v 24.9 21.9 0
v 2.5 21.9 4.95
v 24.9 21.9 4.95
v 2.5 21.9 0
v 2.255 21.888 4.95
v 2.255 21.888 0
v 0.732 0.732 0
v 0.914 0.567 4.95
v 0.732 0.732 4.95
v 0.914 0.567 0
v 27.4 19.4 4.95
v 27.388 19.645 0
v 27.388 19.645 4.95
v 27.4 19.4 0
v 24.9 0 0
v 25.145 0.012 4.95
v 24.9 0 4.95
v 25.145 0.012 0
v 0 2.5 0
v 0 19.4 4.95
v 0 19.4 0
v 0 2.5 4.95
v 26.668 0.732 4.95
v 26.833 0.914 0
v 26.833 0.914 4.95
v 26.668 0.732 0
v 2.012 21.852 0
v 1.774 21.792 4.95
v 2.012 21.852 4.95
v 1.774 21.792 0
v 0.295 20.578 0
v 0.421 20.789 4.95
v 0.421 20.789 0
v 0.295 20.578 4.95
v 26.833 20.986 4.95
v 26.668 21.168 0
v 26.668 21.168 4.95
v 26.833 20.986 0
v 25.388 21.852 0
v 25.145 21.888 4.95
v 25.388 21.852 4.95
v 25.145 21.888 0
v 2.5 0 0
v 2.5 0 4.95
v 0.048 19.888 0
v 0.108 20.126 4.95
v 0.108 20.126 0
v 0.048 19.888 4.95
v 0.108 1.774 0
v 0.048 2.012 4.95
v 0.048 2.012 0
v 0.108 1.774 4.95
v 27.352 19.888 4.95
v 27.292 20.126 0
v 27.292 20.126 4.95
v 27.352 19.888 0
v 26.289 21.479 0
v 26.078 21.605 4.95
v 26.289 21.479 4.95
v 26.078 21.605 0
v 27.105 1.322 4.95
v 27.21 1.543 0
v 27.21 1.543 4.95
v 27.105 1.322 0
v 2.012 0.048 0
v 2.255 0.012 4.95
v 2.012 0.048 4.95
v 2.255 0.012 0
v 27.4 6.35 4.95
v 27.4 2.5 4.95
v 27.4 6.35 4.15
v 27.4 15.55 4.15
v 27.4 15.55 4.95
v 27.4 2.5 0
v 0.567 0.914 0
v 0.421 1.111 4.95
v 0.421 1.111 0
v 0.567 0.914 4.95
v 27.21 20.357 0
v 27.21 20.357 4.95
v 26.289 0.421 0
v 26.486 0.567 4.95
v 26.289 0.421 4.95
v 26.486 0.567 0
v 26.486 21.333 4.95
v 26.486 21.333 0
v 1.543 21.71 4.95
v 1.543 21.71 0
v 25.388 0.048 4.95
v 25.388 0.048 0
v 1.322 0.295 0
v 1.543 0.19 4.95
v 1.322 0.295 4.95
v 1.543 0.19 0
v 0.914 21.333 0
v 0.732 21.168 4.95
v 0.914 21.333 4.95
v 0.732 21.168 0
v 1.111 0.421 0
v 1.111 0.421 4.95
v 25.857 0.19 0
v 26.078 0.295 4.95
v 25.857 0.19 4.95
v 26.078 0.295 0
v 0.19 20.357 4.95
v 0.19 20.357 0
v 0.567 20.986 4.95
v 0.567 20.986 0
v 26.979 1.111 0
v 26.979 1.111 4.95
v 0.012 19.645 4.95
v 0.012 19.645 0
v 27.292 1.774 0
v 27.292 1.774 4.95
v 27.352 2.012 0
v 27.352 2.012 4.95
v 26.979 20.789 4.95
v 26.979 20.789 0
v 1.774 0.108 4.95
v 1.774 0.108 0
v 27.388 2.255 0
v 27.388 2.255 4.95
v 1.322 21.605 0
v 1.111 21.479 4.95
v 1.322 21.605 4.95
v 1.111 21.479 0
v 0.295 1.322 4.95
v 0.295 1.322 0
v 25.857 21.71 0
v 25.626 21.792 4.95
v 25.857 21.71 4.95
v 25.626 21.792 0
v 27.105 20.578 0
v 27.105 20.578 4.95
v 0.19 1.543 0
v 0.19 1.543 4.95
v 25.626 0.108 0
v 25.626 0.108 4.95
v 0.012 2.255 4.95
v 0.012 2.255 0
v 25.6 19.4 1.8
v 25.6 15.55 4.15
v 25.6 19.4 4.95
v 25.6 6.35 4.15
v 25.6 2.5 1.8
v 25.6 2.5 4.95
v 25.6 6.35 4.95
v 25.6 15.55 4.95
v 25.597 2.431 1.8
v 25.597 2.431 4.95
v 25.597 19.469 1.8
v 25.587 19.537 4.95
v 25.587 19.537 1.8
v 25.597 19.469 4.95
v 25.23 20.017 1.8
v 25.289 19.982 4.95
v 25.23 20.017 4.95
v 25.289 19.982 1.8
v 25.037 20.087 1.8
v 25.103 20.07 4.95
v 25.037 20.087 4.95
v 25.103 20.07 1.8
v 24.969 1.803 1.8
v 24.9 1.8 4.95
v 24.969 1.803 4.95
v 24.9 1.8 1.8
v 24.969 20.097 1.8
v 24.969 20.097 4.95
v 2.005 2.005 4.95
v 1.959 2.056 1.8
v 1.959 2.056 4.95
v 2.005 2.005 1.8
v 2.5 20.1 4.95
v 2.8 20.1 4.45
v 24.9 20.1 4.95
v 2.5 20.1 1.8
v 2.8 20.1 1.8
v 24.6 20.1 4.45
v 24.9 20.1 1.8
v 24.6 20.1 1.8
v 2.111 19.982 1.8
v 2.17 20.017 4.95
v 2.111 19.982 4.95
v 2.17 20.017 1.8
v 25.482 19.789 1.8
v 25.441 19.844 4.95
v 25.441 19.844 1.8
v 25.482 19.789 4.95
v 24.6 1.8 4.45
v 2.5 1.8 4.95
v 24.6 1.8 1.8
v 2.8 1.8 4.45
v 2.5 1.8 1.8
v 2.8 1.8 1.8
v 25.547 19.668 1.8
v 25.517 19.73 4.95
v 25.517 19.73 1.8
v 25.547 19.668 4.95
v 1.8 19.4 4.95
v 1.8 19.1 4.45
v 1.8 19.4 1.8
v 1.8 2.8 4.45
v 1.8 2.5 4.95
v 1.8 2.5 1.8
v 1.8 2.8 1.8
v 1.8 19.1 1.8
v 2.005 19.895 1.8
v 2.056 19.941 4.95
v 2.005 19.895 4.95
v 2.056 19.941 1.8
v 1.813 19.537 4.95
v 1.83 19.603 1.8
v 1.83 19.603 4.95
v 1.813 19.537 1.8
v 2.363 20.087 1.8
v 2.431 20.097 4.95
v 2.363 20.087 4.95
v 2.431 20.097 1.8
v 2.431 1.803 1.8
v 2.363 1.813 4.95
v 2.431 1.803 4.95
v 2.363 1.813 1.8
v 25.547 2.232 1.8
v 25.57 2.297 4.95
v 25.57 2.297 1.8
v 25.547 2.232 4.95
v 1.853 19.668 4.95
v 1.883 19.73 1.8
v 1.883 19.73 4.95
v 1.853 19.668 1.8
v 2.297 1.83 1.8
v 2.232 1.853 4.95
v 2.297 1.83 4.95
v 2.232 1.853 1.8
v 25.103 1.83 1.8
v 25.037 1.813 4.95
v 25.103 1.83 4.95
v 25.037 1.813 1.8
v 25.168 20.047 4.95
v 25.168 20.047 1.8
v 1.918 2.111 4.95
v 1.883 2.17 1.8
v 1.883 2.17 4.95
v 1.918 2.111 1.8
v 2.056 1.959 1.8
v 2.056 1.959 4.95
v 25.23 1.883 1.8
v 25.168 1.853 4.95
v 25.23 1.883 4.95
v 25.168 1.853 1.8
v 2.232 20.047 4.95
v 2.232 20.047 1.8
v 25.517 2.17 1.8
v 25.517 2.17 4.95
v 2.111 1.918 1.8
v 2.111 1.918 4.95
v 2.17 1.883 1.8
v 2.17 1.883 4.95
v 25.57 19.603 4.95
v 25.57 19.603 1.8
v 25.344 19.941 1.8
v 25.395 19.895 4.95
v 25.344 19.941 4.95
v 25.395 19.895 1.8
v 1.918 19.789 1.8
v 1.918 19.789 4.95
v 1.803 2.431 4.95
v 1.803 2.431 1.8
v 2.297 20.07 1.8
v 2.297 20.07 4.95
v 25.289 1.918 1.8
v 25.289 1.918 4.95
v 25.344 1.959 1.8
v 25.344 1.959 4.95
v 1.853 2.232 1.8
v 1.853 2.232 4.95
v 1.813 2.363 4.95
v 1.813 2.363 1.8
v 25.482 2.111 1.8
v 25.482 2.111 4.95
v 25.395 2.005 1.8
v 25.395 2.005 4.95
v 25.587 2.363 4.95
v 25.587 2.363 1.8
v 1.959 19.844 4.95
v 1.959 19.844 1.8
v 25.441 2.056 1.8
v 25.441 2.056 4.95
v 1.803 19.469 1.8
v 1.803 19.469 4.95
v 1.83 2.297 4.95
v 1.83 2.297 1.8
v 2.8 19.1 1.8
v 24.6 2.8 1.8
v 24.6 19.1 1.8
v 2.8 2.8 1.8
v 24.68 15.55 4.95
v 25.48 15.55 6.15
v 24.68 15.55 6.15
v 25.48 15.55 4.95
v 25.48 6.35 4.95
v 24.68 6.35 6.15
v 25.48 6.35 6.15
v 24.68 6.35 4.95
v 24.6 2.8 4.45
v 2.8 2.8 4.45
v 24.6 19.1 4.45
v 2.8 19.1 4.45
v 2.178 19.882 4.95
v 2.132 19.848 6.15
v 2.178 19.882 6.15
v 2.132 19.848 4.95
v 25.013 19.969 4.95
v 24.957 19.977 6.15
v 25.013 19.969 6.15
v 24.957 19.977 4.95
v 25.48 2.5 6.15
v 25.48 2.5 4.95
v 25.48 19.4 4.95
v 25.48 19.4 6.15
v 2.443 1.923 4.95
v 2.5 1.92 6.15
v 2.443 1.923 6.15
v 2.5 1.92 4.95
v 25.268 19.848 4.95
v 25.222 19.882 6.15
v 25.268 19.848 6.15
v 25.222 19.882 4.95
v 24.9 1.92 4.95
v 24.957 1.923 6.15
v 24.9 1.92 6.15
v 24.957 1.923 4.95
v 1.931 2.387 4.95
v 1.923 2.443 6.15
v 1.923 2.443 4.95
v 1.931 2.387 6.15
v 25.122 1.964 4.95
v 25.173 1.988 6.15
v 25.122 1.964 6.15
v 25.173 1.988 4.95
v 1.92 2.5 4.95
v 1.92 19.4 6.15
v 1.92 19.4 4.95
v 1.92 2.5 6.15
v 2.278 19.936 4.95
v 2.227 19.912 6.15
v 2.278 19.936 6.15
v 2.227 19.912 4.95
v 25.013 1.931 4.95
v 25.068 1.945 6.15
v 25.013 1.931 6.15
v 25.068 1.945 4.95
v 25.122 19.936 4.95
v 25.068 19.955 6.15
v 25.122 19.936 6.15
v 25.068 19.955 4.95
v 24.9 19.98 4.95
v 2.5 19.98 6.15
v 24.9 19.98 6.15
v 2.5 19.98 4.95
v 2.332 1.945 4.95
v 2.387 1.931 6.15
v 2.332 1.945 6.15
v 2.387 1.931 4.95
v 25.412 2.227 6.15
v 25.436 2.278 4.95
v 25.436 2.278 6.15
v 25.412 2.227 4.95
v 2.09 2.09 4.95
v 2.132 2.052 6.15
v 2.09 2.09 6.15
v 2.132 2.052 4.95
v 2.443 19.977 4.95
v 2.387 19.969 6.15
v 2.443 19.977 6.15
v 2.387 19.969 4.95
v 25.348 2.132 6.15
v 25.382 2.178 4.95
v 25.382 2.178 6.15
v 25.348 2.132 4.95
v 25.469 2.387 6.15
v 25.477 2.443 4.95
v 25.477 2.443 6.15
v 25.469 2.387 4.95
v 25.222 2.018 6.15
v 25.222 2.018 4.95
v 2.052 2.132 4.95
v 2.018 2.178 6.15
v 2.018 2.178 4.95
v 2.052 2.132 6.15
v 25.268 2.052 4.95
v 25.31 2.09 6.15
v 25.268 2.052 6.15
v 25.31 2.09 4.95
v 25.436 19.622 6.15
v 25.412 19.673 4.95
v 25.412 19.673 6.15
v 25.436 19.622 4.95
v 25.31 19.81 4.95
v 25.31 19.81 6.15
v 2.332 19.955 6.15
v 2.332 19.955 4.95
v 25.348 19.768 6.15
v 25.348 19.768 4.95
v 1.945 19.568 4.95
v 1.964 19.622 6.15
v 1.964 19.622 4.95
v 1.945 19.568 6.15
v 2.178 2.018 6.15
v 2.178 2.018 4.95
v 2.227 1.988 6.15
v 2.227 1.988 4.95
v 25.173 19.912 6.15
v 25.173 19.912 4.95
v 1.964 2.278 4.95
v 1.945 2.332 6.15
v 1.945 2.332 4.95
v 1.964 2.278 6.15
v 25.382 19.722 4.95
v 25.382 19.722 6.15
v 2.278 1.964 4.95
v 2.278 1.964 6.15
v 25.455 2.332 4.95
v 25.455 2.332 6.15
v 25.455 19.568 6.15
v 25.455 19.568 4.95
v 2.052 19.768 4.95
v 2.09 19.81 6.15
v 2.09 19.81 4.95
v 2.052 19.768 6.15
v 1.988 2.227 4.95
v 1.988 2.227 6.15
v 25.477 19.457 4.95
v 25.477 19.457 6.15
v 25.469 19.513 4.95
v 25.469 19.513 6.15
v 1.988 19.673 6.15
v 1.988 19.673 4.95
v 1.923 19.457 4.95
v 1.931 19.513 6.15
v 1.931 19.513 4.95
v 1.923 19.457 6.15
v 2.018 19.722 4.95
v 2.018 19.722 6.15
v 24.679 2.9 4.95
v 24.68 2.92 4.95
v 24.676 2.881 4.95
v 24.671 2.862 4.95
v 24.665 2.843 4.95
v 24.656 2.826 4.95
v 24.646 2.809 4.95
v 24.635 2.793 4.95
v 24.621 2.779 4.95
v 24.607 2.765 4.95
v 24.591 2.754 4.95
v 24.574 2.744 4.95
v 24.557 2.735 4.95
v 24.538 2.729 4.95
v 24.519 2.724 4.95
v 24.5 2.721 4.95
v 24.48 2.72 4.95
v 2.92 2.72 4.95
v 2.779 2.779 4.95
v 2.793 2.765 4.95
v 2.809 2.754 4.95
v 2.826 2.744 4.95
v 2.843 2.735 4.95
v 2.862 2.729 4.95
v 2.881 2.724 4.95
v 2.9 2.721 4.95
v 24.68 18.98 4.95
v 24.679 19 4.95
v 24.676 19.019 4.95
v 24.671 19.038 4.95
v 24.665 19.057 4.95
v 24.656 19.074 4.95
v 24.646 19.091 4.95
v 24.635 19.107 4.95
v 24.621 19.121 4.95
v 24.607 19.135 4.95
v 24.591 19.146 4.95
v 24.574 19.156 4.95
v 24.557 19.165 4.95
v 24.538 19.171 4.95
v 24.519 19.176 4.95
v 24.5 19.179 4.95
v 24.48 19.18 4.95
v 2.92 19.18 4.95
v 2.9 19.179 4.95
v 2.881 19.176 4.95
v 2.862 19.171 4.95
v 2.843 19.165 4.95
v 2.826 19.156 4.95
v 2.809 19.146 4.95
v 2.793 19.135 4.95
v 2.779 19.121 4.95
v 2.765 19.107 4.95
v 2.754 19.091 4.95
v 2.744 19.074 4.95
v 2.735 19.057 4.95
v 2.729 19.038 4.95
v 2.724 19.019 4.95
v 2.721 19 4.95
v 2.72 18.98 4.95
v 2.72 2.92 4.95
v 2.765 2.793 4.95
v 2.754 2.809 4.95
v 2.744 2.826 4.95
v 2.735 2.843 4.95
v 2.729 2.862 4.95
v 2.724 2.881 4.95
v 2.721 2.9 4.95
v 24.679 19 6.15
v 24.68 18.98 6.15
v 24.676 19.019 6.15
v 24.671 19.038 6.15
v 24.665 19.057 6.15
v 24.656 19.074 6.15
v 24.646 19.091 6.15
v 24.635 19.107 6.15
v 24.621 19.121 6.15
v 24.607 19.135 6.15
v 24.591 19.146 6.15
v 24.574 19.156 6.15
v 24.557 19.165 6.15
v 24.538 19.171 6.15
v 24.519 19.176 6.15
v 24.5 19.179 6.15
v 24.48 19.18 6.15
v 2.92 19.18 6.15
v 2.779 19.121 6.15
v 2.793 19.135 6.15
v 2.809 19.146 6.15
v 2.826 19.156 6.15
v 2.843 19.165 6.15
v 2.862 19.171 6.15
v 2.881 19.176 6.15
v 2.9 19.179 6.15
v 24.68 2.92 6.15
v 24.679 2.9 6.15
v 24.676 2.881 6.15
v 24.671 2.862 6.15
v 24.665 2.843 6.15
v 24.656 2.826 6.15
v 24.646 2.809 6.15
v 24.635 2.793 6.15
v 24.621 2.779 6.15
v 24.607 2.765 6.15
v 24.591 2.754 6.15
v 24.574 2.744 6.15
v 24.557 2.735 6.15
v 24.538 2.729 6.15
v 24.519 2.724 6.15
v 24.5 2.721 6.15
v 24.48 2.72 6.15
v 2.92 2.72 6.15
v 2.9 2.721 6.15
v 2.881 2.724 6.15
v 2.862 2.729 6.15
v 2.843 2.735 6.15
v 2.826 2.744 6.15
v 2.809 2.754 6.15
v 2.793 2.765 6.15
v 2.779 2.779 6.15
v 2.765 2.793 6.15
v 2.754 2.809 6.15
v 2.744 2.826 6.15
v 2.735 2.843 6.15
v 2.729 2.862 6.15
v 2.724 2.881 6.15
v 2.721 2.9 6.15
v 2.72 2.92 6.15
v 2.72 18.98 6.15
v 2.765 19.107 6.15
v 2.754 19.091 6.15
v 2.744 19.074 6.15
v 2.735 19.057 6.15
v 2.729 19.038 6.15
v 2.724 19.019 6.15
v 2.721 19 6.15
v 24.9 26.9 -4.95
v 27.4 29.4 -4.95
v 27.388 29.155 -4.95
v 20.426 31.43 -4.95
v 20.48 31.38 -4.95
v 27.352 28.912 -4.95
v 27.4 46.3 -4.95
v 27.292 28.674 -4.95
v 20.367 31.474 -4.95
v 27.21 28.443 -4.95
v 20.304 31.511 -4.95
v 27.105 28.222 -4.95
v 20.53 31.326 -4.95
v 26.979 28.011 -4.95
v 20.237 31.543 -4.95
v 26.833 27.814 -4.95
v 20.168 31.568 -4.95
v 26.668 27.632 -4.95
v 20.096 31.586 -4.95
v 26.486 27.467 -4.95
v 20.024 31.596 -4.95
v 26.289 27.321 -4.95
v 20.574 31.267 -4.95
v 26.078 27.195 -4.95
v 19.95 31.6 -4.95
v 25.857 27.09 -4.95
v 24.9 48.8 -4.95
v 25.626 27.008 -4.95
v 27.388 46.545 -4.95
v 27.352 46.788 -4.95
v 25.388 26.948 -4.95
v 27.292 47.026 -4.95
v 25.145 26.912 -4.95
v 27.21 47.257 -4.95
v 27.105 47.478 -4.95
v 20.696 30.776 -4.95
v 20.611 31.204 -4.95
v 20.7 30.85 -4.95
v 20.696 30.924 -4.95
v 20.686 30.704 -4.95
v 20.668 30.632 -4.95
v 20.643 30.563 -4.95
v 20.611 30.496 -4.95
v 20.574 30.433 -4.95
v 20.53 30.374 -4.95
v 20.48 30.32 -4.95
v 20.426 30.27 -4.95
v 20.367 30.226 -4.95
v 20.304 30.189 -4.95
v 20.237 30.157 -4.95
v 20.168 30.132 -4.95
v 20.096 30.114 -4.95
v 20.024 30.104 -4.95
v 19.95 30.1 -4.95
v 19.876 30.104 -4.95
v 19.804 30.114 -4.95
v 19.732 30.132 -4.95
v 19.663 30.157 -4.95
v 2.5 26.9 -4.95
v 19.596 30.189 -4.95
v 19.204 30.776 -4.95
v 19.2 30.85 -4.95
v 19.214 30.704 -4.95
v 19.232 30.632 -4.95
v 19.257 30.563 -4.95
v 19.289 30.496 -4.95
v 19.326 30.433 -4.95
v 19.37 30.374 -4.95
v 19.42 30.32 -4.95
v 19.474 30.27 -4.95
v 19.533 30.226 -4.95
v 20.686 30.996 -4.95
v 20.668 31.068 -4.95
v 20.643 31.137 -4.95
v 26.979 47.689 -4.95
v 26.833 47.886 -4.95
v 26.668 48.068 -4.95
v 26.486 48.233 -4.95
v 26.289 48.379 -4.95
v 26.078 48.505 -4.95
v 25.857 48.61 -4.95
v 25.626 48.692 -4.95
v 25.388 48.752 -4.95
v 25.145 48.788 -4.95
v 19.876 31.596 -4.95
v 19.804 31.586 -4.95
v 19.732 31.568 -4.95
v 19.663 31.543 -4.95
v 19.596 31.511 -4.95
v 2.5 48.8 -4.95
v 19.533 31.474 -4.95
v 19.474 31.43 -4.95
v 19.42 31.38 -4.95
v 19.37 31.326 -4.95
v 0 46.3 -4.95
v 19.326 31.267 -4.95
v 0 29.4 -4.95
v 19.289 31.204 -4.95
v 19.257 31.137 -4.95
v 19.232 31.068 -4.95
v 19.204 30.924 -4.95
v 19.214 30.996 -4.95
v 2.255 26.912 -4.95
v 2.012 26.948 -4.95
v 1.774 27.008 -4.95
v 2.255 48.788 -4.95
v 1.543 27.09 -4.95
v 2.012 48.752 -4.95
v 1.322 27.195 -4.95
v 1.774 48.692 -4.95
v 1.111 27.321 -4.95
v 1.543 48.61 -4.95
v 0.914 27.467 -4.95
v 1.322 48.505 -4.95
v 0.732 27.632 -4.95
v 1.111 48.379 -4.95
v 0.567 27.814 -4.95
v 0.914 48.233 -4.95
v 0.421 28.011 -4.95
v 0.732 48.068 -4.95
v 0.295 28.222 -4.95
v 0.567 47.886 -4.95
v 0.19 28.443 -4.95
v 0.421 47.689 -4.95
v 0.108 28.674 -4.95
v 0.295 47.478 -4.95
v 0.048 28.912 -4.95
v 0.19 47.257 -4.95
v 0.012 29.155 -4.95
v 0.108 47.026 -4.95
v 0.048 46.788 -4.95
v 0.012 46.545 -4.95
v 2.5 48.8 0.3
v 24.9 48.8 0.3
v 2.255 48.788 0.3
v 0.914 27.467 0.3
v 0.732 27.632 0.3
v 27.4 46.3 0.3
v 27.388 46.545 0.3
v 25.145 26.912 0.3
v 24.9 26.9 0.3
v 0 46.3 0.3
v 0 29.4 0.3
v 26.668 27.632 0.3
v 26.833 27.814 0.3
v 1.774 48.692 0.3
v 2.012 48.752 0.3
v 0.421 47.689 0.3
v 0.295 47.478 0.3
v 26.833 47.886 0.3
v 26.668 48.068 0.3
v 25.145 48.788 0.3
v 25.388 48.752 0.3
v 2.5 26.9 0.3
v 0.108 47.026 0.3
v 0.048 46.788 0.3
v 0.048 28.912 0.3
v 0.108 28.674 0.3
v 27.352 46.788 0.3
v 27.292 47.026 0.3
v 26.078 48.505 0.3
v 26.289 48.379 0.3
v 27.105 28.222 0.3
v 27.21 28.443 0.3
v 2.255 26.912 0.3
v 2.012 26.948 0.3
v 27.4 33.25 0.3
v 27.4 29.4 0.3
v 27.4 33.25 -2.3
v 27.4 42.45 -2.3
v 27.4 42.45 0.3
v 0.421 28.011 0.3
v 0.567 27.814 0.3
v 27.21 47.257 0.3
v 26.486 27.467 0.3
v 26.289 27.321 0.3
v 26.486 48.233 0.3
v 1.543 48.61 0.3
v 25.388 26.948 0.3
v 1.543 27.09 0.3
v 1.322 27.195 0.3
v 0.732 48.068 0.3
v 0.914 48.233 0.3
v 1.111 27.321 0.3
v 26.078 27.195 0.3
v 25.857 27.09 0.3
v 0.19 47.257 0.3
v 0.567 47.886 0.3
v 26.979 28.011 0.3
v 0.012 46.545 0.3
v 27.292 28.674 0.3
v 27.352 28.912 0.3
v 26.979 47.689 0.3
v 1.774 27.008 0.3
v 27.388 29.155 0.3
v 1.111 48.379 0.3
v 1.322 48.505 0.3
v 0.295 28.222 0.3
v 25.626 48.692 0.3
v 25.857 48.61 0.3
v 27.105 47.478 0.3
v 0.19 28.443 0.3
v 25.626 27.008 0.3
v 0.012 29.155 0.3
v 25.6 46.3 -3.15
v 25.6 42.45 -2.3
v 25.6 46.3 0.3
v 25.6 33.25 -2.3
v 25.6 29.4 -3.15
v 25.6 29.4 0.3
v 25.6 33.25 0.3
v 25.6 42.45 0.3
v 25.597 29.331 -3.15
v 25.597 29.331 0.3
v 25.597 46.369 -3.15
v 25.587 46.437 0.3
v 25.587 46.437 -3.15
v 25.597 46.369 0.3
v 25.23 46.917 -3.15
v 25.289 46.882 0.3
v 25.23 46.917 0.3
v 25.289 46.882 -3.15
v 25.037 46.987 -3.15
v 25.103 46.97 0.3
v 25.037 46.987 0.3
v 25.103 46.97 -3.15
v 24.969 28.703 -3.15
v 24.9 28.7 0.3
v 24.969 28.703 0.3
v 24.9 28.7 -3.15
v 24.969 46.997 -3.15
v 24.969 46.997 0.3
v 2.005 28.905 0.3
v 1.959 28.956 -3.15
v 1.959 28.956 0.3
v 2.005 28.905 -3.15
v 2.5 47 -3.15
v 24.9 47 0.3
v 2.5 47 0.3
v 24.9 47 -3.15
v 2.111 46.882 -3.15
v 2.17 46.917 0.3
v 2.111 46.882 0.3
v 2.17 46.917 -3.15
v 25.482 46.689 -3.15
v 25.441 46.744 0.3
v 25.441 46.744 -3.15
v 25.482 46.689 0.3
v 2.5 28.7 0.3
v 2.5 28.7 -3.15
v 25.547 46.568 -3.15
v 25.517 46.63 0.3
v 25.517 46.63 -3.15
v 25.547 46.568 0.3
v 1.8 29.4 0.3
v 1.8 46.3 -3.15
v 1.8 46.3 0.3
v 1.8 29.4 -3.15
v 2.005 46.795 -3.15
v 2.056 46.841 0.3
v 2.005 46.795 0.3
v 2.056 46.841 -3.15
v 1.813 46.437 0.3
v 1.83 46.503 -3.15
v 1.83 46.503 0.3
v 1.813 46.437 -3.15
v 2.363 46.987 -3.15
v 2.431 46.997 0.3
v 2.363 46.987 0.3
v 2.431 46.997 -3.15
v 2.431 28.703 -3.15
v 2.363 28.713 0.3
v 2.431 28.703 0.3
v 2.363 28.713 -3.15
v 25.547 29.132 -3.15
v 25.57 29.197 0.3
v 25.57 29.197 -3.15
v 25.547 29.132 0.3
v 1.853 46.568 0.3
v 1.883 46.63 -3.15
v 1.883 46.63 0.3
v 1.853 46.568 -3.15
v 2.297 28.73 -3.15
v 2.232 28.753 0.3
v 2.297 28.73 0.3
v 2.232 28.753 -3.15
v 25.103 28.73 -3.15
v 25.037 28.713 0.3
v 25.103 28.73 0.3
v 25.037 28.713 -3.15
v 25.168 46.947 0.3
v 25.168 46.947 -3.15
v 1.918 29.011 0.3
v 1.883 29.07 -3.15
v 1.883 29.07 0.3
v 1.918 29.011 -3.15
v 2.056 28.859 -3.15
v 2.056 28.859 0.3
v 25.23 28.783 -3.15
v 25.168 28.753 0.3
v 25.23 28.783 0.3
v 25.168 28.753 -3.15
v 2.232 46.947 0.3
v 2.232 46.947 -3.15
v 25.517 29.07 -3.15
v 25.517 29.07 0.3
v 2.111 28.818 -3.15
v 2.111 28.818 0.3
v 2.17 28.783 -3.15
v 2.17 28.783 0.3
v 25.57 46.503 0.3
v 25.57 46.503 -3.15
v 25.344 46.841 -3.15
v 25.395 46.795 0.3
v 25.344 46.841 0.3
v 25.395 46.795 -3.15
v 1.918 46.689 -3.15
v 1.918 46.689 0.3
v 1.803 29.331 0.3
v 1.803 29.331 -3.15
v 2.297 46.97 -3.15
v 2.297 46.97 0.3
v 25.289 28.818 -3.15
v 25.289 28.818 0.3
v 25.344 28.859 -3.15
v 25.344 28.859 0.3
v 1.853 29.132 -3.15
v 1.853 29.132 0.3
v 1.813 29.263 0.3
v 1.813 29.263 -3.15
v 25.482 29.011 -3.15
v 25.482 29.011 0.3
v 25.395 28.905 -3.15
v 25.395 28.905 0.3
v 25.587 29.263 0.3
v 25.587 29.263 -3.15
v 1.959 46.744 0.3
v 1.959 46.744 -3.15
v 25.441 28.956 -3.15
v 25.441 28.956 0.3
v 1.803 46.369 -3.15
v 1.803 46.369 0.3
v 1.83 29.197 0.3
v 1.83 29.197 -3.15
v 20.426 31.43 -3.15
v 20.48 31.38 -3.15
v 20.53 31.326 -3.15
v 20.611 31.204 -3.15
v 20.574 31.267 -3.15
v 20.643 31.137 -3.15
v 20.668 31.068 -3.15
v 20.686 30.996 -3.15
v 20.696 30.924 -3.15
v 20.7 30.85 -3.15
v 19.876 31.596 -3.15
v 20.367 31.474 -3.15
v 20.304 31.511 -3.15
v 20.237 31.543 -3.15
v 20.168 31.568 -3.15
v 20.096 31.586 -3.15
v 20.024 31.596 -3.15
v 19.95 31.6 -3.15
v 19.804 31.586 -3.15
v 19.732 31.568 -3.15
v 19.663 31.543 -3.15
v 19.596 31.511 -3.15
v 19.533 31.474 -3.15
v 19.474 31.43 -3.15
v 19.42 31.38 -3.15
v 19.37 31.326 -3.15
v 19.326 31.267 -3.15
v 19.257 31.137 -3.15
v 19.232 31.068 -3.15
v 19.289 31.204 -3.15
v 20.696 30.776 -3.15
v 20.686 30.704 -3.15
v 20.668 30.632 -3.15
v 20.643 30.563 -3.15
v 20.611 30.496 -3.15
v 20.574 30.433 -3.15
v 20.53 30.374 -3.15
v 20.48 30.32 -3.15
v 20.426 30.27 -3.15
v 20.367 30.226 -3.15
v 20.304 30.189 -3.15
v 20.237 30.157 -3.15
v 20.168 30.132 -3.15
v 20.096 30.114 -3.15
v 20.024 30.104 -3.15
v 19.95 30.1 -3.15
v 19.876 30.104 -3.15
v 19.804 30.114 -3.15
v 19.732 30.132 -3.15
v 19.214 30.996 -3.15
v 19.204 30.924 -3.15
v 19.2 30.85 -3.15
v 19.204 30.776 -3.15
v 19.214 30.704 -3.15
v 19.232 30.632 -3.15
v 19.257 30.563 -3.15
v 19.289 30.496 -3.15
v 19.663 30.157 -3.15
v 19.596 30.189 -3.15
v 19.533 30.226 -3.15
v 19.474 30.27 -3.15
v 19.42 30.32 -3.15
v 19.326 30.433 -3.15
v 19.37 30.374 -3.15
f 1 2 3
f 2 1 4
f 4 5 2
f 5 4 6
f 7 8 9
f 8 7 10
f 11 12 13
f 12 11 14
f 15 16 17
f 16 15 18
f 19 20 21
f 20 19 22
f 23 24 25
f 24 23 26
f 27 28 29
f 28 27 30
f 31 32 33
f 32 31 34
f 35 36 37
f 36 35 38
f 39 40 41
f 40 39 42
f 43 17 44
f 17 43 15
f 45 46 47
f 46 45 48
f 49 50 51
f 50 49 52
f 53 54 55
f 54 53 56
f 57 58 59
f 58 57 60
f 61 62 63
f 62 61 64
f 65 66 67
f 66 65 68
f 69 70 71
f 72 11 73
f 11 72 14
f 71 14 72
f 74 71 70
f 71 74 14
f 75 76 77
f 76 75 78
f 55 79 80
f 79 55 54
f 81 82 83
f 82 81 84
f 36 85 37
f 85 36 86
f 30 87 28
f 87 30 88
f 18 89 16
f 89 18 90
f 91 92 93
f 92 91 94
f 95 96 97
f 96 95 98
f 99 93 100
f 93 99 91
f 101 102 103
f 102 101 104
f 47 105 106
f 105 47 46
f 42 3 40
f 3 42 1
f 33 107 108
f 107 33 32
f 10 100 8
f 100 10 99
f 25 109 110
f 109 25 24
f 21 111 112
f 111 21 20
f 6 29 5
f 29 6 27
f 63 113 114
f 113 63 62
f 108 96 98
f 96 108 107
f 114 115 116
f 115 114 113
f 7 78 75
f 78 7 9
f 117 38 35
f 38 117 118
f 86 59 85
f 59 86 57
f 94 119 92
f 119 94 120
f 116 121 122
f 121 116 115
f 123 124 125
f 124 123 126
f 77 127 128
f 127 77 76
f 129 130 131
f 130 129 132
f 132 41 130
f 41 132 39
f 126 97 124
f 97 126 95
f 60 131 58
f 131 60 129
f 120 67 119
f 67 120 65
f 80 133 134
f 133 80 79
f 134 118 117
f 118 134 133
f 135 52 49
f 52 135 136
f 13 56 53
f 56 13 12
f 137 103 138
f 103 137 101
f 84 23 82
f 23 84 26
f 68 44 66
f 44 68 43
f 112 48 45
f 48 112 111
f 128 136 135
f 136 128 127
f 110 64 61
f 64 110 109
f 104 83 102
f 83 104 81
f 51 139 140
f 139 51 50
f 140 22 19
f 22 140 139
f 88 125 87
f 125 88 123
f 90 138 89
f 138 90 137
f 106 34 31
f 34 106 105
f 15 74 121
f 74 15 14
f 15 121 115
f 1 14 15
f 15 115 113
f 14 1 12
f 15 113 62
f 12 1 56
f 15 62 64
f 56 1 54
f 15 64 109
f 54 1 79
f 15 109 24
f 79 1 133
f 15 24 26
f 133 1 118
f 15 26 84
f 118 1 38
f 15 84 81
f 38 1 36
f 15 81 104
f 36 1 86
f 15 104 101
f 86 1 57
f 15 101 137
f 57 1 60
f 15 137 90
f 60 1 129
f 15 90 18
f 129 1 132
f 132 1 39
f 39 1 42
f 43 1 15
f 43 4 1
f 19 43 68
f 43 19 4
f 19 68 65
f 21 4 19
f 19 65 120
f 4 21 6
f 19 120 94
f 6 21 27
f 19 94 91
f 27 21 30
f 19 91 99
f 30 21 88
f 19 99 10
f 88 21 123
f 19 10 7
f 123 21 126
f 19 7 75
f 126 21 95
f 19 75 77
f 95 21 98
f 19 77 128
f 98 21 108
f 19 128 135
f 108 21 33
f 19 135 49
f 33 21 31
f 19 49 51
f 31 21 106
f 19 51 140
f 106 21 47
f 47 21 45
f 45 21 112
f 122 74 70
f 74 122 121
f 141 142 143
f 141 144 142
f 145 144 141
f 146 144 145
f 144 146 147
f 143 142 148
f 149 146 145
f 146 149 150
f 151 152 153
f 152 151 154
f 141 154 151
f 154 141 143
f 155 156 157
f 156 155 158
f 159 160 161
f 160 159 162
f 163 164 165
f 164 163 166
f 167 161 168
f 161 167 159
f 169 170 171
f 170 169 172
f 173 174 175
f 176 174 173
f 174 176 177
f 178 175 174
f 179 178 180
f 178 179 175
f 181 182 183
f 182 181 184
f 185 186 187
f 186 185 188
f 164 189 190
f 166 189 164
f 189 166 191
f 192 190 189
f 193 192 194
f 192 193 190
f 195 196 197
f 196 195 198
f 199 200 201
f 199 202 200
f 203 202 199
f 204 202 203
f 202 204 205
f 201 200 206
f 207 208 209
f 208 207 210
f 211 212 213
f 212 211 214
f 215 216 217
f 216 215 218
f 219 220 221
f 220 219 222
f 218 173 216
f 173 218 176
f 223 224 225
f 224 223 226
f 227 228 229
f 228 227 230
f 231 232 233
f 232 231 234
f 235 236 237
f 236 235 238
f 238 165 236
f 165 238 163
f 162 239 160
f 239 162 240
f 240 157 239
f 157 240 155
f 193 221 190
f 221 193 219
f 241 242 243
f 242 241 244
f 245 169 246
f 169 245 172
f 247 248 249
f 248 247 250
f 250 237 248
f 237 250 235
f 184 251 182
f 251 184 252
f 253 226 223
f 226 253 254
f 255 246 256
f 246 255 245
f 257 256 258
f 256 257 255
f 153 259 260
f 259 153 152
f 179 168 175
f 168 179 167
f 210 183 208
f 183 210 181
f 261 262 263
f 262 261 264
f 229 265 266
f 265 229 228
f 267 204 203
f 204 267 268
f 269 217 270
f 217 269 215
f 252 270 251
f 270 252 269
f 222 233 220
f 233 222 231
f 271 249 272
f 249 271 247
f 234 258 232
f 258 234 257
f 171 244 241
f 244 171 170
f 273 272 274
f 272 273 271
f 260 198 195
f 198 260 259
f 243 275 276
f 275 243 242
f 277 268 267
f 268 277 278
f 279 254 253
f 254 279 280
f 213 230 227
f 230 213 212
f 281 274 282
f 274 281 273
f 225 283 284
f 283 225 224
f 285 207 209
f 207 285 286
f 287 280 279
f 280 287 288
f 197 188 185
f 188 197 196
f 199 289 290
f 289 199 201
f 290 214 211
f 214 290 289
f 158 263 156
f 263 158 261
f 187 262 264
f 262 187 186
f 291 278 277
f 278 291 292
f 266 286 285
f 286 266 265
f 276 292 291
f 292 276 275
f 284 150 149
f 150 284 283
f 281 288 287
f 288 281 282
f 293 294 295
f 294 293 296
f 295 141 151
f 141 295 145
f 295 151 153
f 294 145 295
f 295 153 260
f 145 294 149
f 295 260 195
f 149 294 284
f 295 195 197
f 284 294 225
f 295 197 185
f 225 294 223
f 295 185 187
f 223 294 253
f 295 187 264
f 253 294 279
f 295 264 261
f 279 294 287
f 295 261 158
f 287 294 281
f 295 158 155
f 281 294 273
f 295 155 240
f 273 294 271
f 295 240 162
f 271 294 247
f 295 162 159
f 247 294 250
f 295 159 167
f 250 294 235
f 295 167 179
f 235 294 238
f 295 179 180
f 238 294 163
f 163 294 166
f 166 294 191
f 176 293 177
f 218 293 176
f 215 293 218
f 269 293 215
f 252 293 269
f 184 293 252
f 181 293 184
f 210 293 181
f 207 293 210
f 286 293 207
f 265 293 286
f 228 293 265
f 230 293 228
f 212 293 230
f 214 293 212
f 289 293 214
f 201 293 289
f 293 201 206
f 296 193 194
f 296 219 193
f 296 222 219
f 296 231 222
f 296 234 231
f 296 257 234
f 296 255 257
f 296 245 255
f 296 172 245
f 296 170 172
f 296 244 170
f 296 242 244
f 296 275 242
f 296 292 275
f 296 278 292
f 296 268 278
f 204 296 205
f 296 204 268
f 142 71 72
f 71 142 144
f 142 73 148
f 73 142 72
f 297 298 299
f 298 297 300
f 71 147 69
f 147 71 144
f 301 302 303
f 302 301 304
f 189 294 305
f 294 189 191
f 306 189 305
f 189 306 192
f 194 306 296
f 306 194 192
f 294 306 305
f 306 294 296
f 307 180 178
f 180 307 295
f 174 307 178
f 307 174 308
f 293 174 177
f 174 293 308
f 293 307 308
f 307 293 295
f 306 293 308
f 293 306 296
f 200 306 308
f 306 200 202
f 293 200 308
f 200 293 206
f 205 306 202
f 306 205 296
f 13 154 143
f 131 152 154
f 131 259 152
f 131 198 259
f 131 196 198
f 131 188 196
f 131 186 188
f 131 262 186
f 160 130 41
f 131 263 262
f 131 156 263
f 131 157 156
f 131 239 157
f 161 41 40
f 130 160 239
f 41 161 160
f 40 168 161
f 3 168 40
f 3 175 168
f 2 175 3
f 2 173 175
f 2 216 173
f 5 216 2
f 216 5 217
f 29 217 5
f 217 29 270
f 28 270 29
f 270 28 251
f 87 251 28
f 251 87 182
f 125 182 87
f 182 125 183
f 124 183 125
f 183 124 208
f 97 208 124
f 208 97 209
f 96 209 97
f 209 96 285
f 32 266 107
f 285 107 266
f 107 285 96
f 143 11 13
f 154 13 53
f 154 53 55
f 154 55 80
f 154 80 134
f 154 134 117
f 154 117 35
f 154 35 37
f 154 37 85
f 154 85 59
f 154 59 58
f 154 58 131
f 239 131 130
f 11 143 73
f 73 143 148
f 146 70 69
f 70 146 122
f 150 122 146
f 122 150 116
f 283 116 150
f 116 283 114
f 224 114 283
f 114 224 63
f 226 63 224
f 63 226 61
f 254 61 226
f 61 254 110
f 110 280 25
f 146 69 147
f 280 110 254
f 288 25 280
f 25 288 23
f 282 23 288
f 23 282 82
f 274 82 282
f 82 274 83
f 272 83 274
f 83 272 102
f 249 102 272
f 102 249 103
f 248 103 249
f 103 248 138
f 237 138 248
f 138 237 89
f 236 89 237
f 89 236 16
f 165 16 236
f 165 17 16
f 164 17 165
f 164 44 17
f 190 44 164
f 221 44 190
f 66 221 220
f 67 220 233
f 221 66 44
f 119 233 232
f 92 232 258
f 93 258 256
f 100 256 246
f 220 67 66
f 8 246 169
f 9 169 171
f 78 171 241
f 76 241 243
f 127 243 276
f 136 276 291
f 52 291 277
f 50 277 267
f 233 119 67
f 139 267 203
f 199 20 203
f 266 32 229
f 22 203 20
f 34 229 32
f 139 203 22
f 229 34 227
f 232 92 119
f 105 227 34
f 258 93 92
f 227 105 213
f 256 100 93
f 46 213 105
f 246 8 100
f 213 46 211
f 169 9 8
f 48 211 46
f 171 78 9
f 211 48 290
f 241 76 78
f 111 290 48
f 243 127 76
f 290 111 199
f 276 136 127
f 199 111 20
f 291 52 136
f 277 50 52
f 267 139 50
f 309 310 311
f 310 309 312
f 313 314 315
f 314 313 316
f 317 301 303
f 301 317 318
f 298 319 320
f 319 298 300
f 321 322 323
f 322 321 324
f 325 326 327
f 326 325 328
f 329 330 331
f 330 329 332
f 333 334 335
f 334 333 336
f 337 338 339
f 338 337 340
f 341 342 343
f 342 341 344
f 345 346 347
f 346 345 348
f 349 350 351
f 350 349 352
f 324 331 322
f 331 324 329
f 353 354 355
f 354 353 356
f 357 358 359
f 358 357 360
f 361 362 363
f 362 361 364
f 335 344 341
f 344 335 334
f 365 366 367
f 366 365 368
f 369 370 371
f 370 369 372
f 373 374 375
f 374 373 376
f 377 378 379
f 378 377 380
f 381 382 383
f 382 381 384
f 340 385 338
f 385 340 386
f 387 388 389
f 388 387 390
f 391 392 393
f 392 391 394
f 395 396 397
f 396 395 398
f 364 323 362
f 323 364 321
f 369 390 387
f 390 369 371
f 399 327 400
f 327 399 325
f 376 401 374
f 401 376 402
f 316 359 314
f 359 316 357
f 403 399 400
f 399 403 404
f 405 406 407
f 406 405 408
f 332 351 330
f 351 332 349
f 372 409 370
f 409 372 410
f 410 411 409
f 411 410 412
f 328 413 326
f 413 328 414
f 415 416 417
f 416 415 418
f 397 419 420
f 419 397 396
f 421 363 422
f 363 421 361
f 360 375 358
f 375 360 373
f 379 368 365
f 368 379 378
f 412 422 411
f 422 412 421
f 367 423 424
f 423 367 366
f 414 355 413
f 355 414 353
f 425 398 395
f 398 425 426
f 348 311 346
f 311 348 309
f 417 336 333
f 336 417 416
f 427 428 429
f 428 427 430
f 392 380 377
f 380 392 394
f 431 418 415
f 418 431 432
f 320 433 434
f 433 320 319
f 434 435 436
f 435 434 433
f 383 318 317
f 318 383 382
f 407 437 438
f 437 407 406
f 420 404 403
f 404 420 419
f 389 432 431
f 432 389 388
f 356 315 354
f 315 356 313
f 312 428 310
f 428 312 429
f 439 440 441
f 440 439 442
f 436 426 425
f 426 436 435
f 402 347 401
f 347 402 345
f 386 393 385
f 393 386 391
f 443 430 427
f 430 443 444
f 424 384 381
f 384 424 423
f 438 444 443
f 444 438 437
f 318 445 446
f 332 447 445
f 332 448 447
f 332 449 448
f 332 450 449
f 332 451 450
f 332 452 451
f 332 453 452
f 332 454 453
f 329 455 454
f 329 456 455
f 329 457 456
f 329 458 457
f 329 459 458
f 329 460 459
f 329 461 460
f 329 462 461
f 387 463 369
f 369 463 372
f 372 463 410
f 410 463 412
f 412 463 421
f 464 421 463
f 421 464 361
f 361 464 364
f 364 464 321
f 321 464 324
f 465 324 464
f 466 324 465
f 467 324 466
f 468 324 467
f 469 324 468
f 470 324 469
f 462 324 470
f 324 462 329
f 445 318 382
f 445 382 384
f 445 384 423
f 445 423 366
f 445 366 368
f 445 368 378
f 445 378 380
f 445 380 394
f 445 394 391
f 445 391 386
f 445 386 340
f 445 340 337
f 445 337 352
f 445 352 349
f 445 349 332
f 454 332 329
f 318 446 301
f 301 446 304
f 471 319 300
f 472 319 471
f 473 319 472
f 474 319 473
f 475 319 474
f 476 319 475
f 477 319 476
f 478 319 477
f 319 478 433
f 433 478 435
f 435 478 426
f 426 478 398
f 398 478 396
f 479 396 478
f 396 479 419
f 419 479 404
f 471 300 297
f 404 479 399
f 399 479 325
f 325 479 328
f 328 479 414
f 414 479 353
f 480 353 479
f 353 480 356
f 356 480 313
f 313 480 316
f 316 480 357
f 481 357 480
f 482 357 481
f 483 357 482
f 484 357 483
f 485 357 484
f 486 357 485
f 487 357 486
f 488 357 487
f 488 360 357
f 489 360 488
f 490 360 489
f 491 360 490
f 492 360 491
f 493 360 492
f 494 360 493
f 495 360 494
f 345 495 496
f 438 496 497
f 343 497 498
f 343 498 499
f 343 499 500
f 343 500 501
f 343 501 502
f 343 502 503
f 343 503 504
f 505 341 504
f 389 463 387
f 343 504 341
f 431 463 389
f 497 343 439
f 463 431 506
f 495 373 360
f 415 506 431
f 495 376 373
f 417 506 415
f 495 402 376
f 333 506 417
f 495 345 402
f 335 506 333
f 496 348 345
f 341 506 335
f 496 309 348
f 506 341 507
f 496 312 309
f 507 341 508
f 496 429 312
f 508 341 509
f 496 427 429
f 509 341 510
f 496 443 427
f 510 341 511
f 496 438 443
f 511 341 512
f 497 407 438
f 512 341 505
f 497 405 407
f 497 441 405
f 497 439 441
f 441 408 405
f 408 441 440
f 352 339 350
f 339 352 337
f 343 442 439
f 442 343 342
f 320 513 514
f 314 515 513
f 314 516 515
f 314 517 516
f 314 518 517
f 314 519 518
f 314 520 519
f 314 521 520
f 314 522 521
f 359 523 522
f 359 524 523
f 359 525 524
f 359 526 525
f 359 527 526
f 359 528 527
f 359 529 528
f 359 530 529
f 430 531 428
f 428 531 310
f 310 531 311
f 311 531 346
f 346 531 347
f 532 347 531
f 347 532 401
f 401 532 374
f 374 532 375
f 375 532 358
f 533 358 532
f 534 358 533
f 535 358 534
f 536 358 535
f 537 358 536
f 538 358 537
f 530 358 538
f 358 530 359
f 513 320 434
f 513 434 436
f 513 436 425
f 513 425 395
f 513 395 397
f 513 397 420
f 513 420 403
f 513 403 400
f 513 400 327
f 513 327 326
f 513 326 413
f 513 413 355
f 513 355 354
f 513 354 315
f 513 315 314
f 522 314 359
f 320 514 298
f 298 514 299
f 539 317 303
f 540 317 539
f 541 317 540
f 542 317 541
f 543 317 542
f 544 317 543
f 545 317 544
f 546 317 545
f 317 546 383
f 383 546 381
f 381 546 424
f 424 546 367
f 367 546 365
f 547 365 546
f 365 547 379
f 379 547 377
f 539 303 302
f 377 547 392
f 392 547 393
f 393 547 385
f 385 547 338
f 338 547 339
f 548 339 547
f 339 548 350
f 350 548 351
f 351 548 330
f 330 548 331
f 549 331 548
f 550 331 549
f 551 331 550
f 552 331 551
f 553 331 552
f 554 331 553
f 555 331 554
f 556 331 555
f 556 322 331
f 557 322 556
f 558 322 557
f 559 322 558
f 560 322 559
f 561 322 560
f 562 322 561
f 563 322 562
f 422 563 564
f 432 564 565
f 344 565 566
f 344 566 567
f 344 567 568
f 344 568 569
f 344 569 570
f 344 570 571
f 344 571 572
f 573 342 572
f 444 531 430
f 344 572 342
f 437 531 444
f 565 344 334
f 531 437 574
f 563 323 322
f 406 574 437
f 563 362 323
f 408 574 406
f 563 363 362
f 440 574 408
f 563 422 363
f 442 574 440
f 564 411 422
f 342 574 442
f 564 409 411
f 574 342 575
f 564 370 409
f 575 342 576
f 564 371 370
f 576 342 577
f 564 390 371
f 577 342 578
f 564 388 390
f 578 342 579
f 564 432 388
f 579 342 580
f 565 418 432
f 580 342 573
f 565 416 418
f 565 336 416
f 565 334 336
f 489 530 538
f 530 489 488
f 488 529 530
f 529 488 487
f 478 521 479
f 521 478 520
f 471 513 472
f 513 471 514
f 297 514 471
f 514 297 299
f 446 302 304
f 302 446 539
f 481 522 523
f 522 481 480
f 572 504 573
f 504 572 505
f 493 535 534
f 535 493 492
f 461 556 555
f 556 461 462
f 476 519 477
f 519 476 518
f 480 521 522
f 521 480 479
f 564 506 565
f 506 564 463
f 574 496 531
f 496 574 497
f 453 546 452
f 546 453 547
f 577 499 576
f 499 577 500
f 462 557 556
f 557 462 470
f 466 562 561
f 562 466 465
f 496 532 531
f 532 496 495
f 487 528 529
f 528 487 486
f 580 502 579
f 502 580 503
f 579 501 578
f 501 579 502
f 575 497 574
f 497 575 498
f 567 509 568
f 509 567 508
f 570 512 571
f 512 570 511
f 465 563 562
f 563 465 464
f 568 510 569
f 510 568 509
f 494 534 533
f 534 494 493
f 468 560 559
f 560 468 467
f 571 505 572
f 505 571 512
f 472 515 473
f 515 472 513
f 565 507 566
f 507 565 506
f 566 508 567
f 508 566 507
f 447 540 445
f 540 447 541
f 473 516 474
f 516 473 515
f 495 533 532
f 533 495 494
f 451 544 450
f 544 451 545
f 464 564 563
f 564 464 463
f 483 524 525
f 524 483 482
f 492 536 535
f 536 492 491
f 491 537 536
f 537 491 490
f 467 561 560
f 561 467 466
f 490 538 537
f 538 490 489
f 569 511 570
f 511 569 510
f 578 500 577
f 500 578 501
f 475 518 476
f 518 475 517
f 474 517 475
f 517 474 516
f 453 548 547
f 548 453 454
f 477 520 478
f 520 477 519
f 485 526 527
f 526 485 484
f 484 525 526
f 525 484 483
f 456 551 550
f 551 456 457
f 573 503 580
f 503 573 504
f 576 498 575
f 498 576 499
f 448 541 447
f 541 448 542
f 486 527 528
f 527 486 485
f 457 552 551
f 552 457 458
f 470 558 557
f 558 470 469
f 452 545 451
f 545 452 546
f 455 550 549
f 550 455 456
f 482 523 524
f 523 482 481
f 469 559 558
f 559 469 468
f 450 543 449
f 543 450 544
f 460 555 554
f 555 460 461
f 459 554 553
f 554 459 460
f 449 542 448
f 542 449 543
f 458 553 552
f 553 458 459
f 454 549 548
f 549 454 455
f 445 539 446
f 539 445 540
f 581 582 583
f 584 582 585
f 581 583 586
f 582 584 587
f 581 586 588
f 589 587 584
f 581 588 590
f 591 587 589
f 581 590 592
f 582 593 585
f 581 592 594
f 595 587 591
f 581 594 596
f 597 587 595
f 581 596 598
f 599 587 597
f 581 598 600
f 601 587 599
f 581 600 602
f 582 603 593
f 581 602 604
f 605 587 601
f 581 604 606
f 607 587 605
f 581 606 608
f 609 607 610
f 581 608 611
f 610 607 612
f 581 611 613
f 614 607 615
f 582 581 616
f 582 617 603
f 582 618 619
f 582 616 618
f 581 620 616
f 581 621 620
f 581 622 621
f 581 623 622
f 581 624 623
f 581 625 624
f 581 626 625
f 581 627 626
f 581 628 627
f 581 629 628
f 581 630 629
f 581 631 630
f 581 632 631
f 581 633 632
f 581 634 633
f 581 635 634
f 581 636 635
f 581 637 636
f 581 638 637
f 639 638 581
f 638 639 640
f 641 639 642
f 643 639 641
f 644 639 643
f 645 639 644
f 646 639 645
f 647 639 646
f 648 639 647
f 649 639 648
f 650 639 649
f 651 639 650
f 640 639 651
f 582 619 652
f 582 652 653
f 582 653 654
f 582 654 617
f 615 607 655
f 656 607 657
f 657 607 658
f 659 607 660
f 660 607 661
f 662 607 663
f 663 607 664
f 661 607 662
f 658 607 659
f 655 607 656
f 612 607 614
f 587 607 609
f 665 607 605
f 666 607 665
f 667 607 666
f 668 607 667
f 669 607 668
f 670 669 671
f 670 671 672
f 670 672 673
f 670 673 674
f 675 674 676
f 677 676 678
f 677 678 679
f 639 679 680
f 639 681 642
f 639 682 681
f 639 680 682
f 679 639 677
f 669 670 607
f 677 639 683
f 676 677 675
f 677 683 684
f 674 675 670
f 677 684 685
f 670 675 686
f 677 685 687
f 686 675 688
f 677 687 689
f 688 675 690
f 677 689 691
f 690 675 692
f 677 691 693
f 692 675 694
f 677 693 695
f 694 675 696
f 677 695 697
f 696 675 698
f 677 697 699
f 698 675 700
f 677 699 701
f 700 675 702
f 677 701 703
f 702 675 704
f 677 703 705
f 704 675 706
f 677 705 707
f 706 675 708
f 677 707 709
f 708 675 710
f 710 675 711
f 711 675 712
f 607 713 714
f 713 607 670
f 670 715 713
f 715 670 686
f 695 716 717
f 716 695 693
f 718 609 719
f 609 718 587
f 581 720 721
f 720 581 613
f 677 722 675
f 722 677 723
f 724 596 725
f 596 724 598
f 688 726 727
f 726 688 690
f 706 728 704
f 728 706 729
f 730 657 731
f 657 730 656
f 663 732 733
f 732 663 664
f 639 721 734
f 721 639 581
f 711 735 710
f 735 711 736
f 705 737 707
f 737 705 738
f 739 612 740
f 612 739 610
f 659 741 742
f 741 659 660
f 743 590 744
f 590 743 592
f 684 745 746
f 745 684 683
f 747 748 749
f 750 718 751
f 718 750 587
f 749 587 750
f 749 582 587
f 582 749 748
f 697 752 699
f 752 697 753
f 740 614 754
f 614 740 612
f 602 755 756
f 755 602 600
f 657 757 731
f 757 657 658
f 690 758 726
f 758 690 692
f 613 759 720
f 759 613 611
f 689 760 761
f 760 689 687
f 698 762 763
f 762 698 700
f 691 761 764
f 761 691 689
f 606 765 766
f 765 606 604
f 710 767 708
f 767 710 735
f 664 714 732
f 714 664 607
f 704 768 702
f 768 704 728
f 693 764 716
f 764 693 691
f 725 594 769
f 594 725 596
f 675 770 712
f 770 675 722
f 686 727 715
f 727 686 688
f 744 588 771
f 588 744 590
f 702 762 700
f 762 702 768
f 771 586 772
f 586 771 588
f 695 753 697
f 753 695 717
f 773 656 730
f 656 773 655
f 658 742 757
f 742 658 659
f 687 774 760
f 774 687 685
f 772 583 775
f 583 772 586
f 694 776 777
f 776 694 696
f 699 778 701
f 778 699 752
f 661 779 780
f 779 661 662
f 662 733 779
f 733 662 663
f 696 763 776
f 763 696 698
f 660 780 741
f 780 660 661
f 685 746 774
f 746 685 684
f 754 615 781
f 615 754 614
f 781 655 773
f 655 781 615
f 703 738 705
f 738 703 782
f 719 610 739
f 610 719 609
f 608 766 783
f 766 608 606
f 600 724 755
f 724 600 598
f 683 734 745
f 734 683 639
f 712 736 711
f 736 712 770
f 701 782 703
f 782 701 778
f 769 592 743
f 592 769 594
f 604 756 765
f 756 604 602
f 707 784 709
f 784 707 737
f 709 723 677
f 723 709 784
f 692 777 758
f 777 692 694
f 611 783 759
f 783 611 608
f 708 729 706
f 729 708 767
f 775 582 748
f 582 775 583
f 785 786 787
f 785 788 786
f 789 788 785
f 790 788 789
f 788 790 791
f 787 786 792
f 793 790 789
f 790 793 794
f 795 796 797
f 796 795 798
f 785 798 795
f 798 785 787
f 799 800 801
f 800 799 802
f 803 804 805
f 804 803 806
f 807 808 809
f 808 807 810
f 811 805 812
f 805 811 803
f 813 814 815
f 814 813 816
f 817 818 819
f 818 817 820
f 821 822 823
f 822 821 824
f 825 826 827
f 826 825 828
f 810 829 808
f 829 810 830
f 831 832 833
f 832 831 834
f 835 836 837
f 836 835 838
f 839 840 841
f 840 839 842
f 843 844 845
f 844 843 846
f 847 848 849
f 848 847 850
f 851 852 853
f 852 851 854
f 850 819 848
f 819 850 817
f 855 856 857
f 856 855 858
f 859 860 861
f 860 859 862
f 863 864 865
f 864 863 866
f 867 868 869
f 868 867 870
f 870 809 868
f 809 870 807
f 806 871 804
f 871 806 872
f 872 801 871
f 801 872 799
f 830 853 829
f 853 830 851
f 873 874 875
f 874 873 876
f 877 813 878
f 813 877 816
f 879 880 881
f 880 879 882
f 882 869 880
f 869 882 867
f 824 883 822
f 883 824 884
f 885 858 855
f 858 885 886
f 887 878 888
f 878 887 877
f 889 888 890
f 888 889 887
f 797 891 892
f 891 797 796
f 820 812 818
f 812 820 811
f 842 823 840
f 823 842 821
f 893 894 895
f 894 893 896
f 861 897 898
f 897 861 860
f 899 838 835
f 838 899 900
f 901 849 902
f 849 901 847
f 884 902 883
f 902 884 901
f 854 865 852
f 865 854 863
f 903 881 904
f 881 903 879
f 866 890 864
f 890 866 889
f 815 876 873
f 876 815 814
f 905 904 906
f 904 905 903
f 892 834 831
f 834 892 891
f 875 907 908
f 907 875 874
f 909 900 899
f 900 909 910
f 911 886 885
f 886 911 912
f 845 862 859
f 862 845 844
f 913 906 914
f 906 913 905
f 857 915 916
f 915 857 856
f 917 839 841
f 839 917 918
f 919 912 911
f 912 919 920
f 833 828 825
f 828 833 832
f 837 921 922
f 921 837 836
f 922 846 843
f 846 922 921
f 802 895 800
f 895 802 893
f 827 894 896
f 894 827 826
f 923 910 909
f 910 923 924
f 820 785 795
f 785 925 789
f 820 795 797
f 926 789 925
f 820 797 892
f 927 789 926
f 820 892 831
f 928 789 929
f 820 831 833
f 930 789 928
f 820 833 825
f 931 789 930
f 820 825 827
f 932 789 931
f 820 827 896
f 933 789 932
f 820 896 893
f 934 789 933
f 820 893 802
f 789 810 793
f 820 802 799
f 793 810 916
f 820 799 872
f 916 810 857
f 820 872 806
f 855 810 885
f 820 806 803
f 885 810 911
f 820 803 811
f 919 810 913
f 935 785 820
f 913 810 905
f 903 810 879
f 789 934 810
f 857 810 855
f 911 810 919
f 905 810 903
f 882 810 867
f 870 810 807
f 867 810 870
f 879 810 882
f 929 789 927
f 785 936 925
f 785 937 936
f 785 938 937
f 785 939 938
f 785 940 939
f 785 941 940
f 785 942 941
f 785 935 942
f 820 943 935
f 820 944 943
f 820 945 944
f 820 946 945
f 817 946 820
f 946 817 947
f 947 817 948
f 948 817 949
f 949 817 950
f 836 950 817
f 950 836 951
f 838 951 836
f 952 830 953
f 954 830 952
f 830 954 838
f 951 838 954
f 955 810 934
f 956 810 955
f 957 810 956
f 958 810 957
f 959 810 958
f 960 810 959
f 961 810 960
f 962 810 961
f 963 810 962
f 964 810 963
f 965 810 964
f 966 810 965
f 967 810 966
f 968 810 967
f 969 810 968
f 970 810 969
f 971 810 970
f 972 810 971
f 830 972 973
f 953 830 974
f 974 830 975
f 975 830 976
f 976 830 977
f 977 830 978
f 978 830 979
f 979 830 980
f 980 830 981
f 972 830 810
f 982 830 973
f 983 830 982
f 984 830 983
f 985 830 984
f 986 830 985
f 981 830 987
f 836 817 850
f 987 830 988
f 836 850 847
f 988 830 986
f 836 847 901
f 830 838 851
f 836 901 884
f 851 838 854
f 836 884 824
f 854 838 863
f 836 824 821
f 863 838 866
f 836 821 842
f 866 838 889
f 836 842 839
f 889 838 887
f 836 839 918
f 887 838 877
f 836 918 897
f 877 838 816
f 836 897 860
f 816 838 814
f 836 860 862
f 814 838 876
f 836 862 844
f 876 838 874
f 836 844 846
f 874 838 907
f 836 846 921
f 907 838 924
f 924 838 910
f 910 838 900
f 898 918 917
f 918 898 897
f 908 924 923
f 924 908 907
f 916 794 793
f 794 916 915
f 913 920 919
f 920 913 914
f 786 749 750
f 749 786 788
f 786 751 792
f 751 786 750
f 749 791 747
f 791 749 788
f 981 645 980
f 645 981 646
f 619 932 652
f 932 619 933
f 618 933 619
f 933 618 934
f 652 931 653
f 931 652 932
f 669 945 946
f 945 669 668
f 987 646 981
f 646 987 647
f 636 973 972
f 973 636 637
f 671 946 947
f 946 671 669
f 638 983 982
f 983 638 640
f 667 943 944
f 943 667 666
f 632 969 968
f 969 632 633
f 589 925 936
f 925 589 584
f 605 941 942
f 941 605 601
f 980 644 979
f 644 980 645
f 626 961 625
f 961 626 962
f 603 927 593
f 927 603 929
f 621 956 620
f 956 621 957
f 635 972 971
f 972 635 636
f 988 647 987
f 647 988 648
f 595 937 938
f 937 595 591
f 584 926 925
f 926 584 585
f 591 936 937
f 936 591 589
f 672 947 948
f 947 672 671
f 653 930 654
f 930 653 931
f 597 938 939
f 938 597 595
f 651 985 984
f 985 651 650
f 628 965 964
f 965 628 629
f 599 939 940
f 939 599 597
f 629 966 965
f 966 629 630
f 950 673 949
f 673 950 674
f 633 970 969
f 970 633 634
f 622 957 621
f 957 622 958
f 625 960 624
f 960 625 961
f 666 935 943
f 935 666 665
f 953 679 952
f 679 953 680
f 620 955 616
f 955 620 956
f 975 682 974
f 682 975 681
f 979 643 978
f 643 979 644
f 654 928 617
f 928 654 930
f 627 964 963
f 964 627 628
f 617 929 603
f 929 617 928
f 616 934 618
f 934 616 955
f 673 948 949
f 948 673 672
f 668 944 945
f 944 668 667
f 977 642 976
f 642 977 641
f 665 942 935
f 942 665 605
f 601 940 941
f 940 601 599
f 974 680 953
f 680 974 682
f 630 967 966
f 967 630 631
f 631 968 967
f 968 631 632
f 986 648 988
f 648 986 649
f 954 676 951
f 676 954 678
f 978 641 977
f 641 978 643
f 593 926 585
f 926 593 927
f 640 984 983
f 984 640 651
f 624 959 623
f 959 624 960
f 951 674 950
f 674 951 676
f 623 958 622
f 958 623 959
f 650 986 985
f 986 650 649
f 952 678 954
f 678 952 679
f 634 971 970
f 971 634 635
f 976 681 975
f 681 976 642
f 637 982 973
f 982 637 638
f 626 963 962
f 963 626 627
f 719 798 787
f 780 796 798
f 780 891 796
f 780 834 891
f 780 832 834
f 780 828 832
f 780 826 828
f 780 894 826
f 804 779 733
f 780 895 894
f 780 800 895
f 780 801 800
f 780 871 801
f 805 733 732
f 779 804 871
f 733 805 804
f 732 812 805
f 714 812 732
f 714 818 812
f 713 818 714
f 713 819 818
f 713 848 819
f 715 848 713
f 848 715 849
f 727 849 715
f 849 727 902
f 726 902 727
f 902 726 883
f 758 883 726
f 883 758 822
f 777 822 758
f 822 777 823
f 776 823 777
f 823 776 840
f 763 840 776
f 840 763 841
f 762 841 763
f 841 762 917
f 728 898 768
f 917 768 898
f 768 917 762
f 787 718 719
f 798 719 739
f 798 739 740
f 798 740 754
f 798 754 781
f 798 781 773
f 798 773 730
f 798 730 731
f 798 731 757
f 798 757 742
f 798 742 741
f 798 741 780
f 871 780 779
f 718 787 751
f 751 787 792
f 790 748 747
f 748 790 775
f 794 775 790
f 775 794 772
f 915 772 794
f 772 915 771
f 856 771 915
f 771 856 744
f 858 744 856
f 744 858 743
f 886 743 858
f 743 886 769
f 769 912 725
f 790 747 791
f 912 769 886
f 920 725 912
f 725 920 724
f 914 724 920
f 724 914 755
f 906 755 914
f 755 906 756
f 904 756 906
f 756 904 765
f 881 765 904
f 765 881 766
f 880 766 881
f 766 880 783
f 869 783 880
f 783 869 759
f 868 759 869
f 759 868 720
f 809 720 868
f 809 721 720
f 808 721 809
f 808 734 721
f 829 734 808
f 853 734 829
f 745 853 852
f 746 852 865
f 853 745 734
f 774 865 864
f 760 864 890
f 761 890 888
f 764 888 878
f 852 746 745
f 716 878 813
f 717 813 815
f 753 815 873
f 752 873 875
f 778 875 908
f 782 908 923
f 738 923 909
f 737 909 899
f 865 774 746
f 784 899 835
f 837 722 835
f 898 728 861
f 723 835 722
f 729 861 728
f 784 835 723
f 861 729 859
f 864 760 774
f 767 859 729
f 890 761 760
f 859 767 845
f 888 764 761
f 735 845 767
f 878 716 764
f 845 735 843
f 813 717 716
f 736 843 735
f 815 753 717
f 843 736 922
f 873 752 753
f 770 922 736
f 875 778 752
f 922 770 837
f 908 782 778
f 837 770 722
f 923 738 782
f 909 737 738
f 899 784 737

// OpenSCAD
/*
 * ESP32-S3-Zero HID Dongle Case — Final Prototype
 * Waveshare ESP32-S3-Zero (pin legs clipped, yellow housing retained)
 *
 * Size: 26.6 x 21.1 x 9.4 mm (pill-shaped, 3D filleted)
 * Print: 0.4mm nozzle / 0.2mm layer / 20% infill / no support / black PLA
 *
 * Features:
 *  - BOOT pinhole only (1.5mm, SIM ejector accessible)
 *  - USB-C port opening
 *  - Press-fit snap rim
 *
 * Usage:
 *  1. Set RENDER_PART below
 *  2. F6 (render) → F7 (export STL)
 *
 * Note: "logi" deboss engraving only available via generate_stl.py
 */

$fn = 64;

RENDER_PART = "preview"; // "preview" | "bottom" | "top" | "assembled"

// ── PCB (Waveshare ESP32-S3-Zero) ──
PCB_L     = 23.5;    // mm
PCB_W     = 18.0;
PCB_T     = 1.0;

// ── Component clearance from PCB surface ──
COMP_TOP  = 2.8;     // ESP32 chip ~2.5mm + margin
COMP_BOT  = 2.5;     // pin legs clipped, yellow housing ~2.5mm remains

// ── USB-C connector ──
USBC_W    = 9.2;
USBC_H    = 3.4;
USBC_OUT  = 1.3;     // protrusion past PCB edge

// ── Case ──
WALL      = 1.8;     // sturdier wall for reliable FDM printing
GAP       = 0.15;    // tight fit tolerance
CR        = 2.5;     // corner radius (pill shape)

// ── Snap rim ──
RIM_H     = 1.2;
RIM_W     = 0.8;
RIM_GAP   = 0.12;

// ── BOOT button pinhole only ──
BOOT_X    = 5.5;     // from USB end
BOOT_Y    = 2.0;     // from left edge
BTN_D     = 1.5;     // SIM ejector size

// ── Derived ──
_il    = PCB_L + GAP * 2;
_iw    = PCB_W + GAP * 2;
_el    = _il + WALL * 2;
_ew    = _iw + WALL * 2;
_eh    = WALL + GAP + COMP_BOT + PCB_T + COMP_TOP + GAP + WALL;
_ir    = max(CR - WALL, 0.5);
_pcb_z = WALL + GAP + COMP_BOT;
_split = _pcb_z + PCB_T / 2;

echo(str("Case: ", _el, " x ", _ew, " x ", _eh, " mm"));

function _cx(from_usb) = _el - WALL - GAP - from_usb;
function _cy(from_left) = WALL + GAP + from_left;

// ── Primitives ──

module rbox(l, w, h, r) {
    r0 = max(0.1, min(r, min(l, w) / 2 - 0.01));
    hull()
        for (x = [r0, l - r0])
            for (y = [r0, w - r0])
                translate([x, y, 0])
                    cylinder(r = r0, h = h);
}

// ── Full enclosed case (pre-split) ──

module full_case() {
    difference() {
        rbox(_el, _ew, _eh, CR);

        translate([WALL, WALL, WALL])
            rbox(_il, _iw, _eh - WALL * 2, _ir);

        translate([_el - WALL - 1, (_ew - USBC_W) / 2, _pcb_z - 0.3])
            cube([WALL + USBC_OUT + 2, USBC_W, USBC_H]);

        translate([_cx(BOOT_X), _cy(BOOT_Y), _eh - WALL - 1])
            cylinder(d = BTN_D, h = WALL + 2);
    }

    _sh = COMP_BOT + GAP;
    _sw = 1.0;

    translate([WALL + 1, WALL, WALL])
        cube([_il - 2, _sw, _sh]);
    translate([WALL + 1, _ew - WALL - _sw, WALL])
        cube([_il - 2, _sw, _sh]);
    translate([WALL, WALL + _sw, WALL])
        cube([_sw, _iw - _sw * 2, _sh]);
}

// ── Bottom case ──

module bottom_case() {
    difference() {
        union() {
            intersection() {
                full_case();
                cube([_el + 1, _ew + 1, _split]);
            }

            difference() {
                translate([WALL + RIM_GAP, WALL + RIM_GAP, _split])
                    rbox(_il - RIM_GAP * 2, _iw - RIM_GAP * 2,
                         RIM_H, max(_ir - RIM_GAP, 0.3));
                translate([WALL + RIM_GAP + RIM_W, WALL + RIM_GAP + RIM_W, _split - 0.1])
                    rbox(_il - RIM_GAP * 2 - RIM_W * 2, _iw - RIM_GAP * 2 - RIM_W * 2,
                         RIM_H + 1, max(_ir - RIM_GAP - RIM_W, 0.2));
            }
        }

        translate([_el - WALL - 1, (_ew - USBC_W) / 2, _pcb_z - 0.3])
            cube([WALL + USBC_OUT + 2, USBC_W, USBC_H + RIM_H + 2]);
    }
}

// ── Top case (assembly position) ──

module _top_assembled() {
    intersection() {
        full_case();
        translate([0, 0, _split])
            cube([_el + 1, _ew + 1, _eh]);
    }
}

// ── Top case (flipped for printing) ──

module top_case() {
    translate([0, 0, _eh - _split])
        mirror([0, 0, 1])
            _top_assembled();
}

// ── Assembly preview ──

module assembled() {
    color("DimGray", 0.9) bottom_case();
    color("DarkSlateGray", 0.85) _top_assembled();
}

// ── Render ──

if (RENDER_PART == "preview") {
    bottom_case();
    translate([0, _ew + 5, 0]) top_case();
}
else if (RENDER_PART == "bottom") { bottom_case(); }
else if (RENDER_PART == "top") { top_case(); }
else if (RENDER_PART == "assembled") { assembled(); }
